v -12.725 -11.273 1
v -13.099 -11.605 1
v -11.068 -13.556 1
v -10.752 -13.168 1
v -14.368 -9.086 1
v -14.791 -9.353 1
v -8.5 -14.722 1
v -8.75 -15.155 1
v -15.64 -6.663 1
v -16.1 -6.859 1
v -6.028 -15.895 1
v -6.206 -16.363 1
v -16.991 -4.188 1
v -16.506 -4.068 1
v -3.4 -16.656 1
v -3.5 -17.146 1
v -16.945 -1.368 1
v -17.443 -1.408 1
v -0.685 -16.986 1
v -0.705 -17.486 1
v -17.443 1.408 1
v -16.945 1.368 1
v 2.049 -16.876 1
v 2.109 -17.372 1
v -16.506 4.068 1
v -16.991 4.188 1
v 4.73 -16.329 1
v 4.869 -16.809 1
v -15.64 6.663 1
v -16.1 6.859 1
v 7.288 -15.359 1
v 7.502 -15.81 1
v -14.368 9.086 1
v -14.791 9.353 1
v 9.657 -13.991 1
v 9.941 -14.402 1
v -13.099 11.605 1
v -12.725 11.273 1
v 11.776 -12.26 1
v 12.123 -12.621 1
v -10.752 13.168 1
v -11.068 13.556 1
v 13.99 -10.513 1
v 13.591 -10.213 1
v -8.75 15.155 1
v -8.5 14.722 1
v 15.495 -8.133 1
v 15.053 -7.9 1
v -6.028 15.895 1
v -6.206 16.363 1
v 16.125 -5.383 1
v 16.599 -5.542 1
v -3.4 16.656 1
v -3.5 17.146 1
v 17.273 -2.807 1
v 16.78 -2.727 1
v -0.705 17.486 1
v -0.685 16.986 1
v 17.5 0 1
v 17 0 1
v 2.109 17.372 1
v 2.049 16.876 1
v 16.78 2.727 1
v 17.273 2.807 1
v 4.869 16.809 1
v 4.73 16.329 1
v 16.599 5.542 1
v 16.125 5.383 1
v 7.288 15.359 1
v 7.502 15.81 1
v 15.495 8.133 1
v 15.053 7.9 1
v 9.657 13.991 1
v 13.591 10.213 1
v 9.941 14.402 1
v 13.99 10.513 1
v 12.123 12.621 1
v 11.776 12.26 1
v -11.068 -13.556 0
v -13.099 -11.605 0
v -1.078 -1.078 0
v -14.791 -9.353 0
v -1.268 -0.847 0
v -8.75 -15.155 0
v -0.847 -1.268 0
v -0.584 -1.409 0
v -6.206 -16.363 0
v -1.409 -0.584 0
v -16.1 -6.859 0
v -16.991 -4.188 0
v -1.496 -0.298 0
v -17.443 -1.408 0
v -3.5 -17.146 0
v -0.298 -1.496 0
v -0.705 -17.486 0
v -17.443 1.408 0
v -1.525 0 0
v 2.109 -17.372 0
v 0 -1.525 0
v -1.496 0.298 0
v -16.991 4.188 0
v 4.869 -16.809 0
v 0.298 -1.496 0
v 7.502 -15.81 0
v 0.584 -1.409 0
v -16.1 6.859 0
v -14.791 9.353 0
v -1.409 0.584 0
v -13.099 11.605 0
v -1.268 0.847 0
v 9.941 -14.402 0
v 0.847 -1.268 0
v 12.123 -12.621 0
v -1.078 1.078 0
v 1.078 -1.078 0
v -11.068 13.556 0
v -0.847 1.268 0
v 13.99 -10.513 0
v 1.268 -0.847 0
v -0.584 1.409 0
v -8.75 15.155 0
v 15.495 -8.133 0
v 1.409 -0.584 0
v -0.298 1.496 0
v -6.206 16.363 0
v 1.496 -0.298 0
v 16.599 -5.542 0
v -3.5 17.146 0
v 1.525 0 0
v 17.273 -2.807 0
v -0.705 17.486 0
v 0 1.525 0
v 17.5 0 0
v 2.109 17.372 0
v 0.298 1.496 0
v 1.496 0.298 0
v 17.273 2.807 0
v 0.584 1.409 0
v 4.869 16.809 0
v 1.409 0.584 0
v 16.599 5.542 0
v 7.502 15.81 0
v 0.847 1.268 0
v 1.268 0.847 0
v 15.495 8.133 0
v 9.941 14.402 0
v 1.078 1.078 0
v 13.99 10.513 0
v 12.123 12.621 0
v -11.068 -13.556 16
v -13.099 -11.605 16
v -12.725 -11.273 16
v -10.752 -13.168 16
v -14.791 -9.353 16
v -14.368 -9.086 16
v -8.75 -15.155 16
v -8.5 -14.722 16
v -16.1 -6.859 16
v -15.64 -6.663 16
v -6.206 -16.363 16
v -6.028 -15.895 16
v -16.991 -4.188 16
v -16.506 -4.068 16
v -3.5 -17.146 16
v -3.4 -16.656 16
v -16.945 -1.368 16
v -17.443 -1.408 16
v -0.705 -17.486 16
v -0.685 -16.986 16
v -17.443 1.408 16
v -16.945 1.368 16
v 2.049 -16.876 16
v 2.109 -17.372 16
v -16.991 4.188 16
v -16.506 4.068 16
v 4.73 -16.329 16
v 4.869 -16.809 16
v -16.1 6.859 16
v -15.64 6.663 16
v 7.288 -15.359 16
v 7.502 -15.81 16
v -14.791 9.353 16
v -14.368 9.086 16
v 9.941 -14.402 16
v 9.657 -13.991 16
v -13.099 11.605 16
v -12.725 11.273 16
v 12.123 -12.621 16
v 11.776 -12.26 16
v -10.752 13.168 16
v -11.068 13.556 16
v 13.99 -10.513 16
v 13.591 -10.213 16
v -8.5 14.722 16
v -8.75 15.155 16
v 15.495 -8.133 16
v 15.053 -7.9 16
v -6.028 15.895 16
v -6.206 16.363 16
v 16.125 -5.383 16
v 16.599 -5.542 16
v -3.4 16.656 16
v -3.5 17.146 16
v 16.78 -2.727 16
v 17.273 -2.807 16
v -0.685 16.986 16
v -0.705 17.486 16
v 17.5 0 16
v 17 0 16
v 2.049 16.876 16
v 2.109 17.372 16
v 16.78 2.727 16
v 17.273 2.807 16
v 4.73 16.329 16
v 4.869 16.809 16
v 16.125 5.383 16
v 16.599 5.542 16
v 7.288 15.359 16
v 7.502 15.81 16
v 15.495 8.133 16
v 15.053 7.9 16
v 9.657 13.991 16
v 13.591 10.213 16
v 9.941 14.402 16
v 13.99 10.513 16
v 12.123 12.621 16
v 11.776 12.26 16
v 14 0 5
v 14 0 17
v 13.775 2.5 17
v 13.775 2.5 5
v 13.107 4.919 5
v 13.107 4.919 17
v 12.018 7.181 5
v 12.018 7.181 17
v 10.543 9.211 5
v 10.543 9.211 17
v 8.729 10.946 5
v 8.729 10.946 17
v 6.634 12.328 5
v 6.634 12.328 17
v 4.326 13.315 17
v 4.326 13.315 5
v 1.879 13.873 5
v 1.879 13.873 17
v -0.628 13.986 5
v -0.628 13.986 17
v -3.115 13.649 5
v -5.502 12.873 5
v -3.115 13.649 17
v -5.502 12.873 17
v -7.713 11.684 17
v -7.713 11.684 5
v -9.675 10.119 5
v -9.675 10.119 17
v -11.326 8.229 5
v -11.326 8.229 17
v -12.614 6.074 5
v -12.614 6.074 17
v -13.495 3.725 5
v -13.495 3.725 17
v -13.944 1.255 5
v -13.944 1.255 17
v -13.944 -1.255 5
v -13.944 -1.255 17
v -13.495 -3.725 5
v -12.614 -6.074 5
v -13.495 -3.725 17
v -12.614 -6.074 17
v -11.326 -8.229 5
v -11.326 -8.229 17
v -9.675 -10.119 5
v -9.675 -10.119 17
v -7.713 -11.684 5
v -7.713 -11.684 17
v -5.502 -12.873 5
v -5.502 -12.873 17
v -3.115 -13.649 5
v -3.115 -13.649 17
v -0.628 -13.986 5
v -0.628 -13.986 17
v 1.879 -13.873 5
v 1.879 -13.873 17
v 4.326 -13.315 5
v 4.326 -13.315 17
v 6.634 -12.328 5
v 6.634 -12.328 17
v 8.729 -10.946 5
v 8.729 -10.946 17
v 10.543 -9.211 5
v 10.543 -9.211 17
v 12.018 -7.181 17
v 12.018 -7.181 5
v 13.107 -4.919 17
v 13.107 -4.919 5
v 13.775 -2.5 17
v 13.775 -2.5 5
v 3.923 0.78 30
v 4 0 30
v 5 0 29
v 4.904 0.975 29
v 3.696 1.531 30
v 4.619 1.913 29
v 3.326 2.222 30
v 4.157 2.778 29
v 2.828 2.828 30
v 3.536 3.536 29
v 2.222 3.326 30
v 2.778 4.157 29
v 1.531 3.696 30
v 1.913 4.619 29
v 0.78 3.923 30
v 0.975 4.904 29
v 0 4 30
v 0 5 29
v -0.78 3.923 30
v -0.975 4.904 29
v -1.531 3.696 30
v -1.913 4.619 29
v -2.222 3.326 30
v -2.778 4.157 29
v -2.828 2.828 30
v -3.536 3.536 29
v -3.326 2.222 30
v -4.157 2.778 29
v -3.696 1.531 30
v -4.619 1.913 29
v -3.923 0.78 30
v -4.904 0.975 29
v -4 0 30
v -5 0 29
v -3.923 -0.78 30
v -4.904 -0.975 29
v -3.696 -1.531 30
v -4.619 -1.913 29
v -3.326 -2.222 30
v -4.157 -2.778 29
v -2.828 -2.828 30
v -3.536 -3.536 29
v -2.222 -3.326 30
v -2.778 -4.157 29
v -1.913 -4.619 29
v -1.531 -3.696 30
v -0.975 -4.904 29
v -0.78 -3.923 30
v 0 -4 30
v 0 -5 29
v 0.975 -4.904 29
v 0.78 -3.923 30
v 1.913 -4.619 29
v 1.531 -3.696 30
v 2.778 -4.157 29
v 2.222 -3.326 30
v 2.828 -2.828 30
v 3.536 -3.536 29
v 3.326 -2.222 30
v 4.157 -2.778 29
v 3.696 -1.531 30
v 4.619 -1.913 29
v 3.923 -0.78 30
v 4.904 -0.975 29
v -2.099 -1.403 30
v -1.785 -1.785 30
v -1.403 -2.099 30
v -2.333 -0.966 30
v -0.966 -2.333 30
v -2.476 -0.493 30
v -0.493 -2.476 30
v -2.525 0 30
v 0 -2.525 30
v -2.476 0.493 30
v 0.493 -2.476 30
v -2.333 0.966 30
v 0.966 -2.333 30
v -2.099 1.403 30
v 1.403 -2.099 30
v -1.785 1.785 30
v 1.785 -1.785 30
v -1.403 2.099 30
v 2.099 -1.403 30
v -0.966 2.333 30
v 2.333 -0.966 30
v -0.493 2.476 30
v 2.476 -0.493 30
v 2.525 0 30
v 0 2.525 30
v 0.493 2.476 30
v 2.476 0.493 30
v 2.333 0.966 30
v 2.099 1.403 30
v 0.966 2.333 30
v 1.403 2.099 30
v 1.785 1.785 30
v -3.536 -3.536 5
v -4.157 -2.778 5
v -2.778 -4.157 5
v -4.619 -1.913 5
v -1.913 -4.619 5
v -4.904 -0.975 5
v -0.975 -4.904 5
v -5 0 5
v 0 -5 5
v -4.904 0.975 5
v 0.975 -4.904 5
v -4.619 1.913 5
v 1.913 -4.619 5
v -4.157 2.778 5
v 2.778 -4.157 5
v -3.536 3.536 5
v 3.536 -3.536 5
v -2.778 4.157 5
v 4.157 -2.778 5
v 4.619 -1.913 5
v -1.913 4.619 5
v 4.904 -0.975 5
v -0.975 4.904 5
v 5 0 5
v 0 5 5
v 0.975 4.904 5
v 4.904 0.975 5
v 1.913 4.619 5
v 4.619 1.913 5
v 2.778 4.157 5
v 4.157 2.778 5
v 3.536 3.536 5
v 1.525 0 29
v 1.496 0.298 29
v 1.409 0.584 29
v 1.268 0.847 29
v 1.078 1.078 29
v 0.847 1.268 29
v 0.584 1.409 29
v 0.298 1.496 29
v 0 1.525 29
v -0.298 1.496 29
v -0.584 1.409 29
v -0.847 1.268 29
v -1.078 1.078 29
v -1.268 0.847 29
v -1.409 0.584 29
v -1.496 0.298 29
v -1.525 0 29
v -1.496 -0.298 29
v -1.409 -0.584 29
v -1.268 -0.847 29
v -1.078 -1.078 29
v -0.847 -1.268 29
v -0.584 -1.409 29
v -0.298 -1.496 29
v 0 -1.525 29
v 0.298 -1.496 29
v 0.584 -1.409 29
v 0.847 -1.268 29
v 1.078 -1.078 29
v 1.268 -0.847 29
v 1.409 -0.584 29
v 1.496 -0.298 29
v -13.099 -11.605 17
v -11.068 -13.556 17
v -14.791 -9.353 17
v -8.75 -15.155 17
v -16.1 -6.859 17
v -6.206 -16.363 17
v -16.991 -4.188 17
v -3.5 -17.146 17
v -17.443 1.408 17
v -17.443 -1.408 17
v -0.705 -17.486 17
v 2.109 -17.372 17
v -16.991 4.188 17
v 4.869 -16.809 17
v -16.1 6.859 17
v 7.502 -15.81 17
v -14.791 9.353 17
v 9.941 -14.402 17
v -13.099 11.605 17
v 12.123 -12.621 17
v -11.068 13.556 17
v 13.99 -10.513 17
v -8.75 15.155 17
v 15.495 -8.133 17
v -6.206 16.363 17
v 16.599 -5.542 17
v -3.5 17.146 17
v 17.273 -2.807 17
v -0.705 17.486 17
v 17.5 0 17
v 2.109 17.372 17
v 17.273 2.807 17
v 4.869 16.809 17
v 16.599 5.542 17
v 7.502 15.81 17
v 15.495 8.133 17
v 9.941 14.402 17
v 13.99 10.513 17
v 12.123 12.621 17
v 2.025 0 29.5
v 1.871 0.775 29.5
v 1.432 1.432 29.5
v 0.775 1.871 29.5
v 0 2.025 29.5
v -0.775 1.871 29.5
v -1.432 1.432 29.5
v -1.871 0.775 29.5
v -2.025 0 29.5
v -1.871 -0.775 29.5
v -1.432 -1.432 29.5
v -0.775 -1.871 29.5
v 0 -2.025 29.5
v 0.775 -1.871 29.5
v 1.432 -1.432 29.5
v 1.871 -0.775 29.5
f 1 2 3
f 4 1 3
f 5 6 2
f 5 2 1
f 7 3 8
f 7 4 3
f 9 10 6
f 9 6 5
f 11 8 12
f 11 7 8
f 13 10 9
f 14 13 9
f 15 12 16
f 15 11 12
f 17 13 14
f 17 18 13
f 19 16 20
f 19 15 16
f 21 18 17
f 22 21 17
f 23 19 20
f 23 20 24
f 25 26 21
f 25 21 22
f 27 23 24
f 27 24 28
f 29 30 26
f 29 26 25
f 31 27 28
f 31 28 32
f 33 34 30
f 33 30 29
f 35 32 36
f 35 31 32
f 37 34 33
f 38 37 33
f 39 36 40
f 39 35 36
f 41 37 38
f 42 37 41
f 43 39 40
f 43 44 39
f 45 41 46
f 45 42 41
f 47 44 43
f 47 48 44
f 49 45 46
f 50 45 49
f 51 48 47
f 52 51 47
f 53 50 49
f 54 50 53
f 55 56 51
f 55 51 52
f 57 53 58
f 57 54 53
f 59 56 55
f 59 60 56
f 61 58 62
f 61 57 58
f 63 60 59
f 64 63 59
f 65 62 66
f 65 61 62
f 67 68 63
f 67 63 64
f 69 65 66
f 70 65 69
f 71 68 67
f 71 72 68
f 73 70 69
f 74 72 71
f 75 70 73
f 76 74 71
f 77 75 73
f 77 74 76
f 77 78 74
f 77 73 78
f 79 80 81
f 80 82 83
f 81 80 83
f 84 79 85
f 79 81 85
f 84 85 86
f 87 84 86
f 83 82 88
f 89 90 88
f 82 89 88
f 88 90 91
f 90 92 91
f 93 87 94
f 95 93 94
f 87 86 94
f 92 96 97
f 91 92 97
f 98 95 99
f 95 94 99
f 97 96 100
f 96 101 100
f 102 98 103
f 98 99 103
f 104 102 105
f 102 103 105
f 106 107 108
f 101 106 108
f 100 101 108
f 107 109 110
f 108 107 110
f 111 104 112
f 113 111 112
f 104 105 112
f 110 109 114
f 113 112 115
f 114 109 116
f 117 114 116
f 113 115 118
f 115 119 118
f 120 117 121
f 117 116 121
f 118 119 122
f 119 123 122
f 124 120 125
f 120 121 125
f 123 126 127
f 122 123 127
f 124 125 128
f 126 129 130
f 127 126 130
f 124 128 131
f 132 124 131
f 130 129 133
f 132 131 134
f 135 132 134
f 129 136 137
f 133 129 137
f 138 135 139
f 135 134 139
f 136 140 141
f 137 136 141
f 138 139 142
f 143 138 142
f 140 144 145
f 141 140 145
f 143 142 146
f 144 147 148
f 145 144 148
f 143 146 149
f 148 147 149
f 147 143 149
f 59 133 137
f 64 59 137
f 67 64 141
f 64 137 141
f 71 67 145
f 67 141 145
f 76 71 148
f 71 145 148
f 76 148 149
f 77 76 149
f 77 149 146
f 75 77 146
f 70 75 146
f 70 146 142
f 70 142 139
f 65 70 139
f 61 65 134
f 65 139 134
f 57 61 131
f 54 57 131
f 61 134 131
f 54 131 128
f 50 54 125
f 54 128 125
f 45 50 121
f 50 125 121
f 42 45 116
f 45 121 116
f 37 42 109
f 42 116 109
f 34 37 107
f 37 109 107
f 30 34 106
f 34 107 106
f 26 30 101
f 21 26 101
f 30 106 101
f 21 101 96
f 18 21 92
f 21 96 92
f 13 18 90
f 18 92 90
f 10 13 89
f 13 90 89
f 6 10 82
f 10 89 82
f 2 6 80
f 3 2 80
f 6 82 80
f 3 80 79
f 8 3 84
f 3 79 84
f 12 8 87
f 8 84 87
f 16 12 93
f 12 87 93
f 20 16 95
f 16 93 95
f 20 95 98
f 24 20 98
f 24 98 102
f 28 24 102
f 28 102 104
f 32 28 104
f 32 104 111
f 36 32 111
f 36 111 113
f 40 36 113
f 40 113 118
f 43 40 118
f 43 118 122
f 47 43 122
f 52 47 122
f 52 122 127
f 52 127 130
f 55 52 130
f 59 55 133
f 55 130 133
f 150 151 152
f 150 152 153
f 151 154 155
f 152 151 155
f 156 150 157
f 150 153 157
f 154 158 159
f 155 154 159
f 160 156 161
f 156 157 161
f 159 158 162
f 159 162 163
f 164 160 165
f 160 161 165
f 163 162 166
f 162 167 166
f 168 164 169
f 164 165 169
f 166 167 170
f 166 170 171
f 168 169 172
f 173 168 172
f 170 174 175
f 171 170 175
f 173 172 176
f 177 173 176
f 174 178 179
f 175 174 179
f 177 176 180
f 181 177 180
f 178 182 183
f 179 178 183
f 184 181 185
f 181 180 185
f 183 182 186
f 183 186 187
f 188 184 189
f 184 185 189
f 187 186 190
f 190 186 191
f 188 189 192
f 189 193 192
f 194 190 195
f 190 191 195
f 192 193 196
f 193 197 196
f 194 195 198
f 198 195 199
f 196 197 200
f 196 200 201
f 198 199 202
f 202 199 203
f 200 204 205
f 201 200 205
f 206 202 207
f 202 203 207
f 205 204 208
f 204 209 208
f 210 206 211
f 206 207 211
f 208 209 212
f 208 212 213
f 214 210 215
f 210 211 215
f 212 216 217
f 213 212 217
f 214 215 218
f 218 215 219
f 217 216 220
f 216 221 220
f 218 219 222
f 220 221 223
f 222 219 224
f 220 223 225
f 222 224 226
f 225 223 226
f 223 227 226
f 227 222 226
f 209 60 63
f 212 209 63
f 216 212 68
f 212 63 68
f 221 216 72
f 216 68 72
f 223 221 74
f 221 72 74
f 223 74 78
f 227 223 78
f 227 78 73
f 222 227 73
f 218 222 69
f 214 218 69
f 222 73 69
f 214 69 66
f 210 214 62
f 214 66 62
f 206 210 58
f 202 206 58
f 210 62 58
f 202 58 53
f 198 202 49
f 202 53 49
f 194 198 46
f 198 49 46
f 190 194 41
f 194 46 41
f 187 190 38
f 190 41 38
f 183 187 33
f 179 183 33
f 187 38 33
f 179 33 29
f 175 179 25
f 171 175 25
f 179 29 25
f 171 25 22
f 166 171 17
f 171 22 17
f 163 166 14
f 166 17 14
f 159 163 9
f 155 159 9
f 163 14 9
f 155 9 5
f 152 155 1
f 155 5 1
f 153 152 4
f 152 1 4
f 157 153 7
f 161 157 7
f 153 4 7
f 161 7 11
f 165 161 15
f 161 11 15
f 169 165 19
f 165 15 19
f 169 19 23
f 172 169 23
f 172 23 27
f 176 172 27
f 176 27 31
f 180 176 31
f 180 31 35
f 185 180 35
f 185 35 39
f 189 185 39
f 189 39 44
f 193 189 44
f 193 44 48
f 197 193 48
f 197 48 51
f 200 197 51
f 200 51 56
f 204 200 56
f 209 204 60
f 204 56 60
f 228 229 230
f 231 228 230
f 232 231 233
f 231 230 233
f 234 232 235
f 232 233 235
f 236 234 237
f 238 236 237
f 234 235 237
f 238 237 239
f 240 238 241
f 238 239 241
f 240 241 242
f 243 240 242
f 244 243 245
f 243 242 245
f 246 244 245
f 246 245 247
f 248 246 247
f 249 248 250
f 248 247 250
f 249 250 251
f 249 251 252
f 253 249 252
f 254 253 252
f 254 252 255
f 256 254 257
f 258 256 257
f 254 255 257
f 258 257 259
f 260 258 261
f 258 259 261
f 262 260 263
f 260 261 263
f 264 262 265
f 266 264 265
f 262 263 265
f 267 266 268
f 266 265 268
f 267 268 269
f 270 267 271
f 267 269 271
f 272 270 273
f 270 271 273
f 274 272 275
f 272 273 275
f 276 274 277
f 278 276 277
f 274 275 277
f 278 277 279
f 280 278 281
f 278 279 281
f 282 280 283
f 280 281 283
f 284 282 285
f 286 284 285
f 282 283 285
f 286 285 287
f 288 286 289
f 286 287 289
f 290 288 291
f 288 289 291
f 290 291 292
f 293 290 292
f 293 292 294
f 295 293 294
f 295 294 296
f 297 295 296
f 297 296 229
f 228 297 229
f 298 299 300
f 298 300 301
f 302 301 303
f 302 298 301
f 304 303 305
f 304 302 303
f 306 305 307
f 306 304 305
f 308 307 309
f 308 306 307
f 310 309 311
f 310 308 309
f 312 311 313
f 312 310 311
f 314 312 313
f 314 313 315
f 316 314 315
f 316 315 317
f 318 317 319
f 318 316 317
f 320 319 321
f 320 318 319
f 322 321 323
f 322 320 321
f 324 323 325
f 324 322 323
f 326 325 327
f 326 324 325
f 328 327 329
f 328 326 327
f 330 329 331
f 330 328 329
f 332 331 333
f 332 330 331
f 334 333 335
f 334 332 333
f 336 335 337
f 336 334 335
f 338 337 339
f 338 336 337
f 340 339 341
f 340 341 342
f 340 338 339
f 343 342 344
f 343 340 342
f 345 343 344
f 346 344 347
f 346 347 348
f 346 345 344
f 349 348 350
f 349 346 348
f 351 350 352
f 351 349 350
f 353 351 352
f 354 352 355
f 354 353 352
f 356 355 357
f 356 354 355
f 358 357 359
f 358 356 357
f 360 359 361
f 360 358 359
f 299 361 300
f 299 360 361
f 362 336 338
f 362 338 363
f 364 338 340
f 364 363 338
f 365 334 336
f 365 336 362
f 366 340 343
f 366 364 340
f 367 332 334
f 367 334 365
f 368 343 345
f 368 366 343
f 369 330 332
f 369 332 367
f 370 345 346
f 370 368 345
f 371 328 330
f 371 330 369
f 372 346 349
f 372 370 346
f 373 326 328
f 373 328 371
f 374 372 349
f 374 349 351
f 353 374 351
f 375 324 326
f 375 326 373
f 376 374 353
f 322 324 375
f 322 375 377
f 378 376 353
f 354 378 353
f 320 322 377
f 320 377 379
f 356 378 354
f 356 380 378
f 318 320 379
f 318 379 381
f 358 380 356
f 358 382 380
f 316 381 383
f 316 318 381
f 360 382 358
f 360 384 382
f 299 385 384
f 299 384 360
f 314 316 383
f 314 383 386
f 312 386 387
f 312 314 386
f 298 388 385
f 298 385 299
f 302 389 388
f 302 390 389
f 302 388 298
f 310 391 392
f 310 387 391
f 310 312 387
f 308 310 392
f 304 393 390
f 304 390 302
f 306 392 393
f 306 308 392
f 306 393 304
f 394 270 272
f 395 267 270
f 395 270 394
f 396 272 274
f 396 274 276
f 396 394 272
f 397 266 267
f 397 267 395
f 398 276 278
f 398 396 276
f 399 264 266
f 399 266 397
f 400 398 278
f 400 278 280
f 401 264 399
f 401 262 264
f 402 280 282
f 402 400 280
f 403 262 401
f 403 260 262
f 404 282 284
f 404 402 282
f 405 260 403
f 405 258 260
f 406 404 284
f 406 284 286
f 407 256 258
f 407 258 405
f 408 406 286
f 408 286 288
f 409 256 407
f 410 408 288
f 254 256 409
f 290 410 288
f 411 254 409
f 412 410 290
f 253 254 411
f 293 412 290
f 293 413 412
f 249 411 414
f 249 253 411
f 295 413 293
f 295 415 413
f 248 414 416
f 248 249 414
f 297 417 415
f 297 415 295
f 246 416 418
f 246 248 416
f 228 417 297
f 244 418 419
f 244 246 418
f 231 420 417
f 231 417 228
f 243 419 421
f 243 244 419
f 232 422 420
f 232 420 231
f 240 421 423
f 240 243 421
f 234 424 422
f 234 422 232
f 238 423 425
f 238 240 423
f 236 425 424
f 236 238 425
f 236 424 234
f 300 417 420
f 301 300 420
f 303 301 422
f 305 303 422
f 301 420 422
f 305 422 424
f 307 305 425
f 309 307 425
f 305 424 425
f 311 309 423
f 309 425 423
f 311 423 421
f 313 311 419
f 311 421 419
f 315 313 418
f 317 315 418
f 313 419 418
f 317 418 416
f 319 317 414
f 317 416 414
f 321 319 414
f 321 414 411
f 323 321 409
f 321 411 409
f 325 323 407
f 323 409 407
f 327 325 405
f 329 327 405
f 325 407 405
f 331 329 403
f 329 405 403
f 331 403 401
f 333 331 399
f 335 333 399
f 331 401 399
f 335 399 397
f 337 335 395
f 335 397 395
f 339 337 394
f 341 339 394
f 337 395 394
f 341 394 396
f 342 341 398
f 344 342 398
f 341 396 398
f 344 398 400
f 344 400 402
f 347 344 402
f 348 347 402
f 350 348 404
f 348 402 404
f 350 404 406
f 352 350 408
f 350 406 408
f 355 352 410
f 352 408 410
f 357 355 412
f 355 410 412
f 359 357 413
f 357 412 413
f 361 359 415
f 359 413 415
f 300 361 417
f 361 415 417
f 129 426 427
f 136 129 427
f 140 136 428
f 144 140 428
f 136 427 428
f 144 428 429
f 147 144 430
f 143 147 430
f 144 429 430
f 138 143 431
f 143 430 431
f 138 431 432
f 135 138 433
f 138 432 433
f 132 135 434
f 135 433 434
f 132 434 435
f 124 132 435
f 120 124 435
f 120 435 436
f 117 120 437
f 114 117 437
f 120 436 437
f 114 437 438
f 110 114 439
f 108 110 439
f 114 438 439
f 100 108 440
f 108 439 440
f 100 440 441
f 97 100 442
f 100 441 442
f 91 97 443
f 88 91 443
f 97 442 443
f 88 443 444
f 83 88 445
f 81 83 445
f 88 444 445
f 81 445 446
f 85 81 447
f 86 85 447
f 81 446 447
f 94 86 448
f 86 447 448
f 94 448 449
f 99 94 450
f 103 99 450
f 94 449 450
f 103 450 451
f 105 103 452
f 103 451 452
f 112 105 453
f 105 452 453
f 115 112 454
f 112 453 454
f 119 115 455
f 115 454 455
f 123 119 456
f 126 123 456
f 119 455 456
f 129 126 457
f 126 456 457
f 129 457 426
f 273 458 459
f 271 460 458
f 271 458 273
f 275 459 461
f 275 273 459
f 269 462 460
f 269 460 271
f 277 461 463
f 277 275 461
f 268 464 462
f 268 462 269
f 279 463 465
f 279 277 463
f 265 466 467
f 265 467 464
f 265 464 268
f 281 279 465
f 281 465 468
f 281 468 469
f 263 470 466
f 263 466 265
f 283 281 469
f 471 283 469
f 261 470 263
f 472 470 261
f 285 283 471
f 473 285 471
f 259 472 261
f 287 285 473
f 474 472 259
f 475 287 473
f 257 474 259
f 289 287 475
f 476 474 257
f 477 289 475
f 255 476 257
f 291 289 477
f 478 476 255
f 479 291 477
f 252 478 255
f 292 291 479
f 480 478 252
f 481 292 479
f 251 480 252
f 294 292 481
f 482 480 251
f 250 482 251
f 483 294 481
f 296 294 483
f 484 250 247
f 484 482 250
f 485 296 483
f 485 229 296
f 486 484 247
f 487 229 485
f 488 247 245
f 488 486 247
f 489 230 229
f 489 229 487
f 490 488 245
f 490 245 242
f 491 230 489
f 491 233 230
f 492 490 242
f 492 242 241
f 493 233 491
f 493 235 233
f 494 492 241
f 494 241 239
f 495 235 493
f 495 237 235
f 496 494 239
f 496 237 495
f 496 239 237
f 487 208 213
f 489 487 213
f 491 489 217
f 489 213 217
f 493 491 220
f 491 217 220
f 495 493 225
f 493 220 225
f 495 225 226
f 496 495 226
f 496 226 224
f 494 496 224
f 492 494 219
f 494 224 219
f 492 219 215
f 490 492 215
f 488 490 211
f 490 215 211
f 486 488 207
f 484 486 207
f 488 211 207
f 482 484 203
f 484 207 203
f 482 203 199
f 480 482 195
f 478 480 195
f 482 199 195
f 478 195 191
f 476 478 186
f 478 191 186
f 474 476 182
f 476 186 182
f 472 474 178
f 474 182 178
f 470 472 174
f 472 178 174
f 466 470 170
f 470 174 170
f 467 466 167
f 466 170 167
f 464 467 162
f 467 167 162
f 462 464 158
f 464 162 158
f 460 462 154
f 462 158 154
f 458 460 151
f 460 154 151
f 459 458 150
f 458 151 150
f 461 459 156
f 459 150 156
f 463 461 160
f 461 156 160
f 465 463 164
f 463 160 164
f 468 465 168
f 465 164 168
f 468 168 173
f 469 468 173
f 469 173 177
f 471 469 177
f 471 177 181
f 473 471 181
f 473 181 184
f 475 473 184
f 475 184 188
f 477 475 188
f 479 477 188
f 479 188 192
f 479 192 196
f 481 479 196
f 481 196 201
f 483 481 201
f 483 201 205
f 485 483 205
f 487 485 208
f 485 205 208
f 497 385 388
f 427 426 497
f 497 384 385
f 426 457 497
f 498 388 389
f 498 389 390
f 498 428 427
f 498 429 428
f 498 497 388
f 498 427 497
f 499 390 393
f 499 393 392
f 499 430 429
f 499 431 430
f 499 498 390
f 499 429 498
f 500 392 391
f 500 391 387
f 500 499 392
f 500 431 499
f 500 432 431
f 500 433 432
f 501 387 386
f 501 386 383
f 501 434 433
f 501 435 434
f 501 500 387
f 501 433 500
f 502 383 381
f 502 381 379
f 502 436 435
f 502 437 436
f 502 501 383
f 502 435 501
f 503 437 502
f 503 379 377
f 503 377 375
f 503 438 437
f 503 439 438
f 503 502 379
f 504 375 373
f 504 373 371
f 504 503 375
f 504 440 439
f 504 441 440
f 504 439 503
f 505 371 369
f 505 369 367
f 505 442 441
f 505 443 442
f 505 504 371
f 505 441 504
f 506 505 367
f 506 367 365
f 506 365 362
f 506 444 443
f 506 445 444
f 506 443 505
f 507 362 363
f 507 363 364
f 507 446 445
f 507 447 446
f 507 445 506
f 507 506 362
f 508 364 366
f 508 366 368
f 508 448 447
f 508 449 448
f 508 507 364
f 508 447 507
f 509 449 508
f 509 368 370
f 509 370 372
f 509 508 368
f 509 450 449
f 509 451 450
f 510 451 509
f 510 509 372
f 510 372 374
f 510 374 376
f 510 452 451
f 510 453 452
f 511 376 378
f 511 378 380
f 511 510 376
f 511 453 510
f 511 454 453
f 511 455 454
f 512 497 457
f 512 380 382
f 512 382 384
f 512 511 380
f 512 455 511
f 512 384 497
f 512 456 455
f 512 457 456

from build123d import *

# Parameters (mm, degrees)
F0_R      = 17.5
F1_DEPTH  = 1
F2_R      = 17
F3_DEPTH  = 15
F4_R      = 17.5
F5_DEPTH  = 1
F6_R      = 14
F7_DEPTH  = 12
F8_R      = 5
F9_DEPTH  = 25
F10_R     = 1.525
F11_DEPTH = 30
F12_SIZE  = 1


with BuildPart() as f1:
    # F0 (on Top) → F1 (new body)
    with BuildSketch(Plane.XY):
        Circle(F0_R)
    extrude(amount=F1_DEPTH)

    # F2 (on face) → F3 (join)
    with BuildSketch(Plane.XY.offset(1)):
        Circle(F2_R)
    extrude(amount=F3_DEPTH)

    # F4 (on face) → F5 (join)
    with BuildSketch(Plane.XY.offset(16)):
        Circle(F4_R)
    extrude(amount=F5_DEPTH)

    # F6 (on face) → F7 (cut)
    with BuildSketch(Plane.XY.offset(17)):
        Circle(F6_R)
    extrude(amount=-F7_DEPTH, mode=Mode.SUBTRACT)

    # F8 (on face) → F9 (join)
    with BuildSketch(Plane.XY.offset(5)):
        Circle(F8_R)
    extrude(amount=F9_DEPTH)

    # F10 (on face) → F11 (cut, through all)
    with BuildSketch(Plane.XY.offset(30)):
        Circle(F10_R)
    extrude(amount=-F11_DEPTH, mode=Mode.SUBTRACT)

    # F12
    f12_edges = [f1.edges().sort_by_distance(p)[0] for p in [
        (-1.525, 0, 30),
        (-5, 0, 30),
    ]]
    chamfer(f12_edges, length=F12_SIZE)


solid = f1.part
